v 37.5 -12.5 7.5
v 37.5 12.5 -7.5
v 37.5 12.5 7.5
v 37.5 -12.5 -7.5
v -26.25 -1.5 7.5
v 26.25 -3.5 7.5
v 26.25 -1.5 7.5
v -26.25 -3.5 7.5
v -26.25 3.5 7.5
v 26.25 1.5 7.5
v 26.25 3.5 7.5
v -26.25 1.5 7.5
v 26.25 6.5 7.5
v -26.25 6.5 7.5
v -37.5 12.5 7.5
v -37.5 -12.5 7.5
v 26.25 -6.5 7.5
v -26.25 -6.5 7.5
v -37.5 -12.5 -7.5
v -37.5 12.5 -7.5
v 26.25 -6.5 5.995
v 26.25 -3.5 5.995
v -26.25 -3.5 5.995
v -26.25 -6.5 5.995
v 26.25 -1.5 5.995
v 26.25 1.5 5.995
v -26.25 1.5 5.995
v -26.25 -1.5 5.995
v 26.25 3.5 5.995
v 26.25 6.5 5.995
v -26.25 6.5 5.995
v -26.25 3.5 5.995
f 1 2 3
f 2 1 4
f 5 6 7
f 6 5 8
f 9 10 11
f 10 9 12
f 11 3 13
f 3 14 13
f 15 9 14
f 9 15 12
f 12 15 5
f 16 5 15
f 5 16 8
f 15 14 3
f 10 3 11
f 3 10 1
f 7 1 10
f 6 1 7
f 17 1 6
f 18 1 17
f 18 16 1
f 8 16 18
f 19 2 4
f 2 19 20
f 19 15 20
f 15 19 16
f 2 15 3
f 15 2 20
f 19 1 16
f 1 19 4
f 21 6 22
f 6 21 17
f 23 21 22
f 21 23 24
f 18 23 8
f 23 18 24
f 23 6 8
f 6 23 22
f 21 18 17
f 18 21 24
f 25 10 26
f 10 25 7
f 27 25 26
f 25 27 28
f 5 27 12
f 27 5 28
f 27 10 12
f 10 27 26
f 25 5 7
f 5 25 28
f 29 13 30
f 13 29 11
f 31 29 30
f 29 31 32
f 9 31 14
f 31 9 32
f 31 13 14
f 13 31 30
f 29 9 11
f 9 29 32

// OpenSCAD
// Bloque Jenga — Torre Sabia — DIFÍCIL (3 líneas / ⚡)
BLOCK_L = 75; BLOCK_W = 25; BLOCK_H = 15;
MARK_DEPTH = 1.5; MARK_W = 3; MARK_GAP = 5;

module bloque_base() {
  cube([BLOCK_L, BLOCK_W, BLOCK_H], center = true);
}

module marca_linea(offset_y) {
  translate([0, offset_y, BLOCK_H/2 - MARK_DEPTH/2])
    cube([BLOCK_L * 0.7, MARK_W, MARK_DEPTH + 0.01], center = true);
}

module bloque_dificil() {
  difference() {
    bloque_base();
    marca_linea(-MARK_GAP);
    marca_linea(0);
    marca_linea(MARK_GAP);
  }
}

bloque_dificil();
